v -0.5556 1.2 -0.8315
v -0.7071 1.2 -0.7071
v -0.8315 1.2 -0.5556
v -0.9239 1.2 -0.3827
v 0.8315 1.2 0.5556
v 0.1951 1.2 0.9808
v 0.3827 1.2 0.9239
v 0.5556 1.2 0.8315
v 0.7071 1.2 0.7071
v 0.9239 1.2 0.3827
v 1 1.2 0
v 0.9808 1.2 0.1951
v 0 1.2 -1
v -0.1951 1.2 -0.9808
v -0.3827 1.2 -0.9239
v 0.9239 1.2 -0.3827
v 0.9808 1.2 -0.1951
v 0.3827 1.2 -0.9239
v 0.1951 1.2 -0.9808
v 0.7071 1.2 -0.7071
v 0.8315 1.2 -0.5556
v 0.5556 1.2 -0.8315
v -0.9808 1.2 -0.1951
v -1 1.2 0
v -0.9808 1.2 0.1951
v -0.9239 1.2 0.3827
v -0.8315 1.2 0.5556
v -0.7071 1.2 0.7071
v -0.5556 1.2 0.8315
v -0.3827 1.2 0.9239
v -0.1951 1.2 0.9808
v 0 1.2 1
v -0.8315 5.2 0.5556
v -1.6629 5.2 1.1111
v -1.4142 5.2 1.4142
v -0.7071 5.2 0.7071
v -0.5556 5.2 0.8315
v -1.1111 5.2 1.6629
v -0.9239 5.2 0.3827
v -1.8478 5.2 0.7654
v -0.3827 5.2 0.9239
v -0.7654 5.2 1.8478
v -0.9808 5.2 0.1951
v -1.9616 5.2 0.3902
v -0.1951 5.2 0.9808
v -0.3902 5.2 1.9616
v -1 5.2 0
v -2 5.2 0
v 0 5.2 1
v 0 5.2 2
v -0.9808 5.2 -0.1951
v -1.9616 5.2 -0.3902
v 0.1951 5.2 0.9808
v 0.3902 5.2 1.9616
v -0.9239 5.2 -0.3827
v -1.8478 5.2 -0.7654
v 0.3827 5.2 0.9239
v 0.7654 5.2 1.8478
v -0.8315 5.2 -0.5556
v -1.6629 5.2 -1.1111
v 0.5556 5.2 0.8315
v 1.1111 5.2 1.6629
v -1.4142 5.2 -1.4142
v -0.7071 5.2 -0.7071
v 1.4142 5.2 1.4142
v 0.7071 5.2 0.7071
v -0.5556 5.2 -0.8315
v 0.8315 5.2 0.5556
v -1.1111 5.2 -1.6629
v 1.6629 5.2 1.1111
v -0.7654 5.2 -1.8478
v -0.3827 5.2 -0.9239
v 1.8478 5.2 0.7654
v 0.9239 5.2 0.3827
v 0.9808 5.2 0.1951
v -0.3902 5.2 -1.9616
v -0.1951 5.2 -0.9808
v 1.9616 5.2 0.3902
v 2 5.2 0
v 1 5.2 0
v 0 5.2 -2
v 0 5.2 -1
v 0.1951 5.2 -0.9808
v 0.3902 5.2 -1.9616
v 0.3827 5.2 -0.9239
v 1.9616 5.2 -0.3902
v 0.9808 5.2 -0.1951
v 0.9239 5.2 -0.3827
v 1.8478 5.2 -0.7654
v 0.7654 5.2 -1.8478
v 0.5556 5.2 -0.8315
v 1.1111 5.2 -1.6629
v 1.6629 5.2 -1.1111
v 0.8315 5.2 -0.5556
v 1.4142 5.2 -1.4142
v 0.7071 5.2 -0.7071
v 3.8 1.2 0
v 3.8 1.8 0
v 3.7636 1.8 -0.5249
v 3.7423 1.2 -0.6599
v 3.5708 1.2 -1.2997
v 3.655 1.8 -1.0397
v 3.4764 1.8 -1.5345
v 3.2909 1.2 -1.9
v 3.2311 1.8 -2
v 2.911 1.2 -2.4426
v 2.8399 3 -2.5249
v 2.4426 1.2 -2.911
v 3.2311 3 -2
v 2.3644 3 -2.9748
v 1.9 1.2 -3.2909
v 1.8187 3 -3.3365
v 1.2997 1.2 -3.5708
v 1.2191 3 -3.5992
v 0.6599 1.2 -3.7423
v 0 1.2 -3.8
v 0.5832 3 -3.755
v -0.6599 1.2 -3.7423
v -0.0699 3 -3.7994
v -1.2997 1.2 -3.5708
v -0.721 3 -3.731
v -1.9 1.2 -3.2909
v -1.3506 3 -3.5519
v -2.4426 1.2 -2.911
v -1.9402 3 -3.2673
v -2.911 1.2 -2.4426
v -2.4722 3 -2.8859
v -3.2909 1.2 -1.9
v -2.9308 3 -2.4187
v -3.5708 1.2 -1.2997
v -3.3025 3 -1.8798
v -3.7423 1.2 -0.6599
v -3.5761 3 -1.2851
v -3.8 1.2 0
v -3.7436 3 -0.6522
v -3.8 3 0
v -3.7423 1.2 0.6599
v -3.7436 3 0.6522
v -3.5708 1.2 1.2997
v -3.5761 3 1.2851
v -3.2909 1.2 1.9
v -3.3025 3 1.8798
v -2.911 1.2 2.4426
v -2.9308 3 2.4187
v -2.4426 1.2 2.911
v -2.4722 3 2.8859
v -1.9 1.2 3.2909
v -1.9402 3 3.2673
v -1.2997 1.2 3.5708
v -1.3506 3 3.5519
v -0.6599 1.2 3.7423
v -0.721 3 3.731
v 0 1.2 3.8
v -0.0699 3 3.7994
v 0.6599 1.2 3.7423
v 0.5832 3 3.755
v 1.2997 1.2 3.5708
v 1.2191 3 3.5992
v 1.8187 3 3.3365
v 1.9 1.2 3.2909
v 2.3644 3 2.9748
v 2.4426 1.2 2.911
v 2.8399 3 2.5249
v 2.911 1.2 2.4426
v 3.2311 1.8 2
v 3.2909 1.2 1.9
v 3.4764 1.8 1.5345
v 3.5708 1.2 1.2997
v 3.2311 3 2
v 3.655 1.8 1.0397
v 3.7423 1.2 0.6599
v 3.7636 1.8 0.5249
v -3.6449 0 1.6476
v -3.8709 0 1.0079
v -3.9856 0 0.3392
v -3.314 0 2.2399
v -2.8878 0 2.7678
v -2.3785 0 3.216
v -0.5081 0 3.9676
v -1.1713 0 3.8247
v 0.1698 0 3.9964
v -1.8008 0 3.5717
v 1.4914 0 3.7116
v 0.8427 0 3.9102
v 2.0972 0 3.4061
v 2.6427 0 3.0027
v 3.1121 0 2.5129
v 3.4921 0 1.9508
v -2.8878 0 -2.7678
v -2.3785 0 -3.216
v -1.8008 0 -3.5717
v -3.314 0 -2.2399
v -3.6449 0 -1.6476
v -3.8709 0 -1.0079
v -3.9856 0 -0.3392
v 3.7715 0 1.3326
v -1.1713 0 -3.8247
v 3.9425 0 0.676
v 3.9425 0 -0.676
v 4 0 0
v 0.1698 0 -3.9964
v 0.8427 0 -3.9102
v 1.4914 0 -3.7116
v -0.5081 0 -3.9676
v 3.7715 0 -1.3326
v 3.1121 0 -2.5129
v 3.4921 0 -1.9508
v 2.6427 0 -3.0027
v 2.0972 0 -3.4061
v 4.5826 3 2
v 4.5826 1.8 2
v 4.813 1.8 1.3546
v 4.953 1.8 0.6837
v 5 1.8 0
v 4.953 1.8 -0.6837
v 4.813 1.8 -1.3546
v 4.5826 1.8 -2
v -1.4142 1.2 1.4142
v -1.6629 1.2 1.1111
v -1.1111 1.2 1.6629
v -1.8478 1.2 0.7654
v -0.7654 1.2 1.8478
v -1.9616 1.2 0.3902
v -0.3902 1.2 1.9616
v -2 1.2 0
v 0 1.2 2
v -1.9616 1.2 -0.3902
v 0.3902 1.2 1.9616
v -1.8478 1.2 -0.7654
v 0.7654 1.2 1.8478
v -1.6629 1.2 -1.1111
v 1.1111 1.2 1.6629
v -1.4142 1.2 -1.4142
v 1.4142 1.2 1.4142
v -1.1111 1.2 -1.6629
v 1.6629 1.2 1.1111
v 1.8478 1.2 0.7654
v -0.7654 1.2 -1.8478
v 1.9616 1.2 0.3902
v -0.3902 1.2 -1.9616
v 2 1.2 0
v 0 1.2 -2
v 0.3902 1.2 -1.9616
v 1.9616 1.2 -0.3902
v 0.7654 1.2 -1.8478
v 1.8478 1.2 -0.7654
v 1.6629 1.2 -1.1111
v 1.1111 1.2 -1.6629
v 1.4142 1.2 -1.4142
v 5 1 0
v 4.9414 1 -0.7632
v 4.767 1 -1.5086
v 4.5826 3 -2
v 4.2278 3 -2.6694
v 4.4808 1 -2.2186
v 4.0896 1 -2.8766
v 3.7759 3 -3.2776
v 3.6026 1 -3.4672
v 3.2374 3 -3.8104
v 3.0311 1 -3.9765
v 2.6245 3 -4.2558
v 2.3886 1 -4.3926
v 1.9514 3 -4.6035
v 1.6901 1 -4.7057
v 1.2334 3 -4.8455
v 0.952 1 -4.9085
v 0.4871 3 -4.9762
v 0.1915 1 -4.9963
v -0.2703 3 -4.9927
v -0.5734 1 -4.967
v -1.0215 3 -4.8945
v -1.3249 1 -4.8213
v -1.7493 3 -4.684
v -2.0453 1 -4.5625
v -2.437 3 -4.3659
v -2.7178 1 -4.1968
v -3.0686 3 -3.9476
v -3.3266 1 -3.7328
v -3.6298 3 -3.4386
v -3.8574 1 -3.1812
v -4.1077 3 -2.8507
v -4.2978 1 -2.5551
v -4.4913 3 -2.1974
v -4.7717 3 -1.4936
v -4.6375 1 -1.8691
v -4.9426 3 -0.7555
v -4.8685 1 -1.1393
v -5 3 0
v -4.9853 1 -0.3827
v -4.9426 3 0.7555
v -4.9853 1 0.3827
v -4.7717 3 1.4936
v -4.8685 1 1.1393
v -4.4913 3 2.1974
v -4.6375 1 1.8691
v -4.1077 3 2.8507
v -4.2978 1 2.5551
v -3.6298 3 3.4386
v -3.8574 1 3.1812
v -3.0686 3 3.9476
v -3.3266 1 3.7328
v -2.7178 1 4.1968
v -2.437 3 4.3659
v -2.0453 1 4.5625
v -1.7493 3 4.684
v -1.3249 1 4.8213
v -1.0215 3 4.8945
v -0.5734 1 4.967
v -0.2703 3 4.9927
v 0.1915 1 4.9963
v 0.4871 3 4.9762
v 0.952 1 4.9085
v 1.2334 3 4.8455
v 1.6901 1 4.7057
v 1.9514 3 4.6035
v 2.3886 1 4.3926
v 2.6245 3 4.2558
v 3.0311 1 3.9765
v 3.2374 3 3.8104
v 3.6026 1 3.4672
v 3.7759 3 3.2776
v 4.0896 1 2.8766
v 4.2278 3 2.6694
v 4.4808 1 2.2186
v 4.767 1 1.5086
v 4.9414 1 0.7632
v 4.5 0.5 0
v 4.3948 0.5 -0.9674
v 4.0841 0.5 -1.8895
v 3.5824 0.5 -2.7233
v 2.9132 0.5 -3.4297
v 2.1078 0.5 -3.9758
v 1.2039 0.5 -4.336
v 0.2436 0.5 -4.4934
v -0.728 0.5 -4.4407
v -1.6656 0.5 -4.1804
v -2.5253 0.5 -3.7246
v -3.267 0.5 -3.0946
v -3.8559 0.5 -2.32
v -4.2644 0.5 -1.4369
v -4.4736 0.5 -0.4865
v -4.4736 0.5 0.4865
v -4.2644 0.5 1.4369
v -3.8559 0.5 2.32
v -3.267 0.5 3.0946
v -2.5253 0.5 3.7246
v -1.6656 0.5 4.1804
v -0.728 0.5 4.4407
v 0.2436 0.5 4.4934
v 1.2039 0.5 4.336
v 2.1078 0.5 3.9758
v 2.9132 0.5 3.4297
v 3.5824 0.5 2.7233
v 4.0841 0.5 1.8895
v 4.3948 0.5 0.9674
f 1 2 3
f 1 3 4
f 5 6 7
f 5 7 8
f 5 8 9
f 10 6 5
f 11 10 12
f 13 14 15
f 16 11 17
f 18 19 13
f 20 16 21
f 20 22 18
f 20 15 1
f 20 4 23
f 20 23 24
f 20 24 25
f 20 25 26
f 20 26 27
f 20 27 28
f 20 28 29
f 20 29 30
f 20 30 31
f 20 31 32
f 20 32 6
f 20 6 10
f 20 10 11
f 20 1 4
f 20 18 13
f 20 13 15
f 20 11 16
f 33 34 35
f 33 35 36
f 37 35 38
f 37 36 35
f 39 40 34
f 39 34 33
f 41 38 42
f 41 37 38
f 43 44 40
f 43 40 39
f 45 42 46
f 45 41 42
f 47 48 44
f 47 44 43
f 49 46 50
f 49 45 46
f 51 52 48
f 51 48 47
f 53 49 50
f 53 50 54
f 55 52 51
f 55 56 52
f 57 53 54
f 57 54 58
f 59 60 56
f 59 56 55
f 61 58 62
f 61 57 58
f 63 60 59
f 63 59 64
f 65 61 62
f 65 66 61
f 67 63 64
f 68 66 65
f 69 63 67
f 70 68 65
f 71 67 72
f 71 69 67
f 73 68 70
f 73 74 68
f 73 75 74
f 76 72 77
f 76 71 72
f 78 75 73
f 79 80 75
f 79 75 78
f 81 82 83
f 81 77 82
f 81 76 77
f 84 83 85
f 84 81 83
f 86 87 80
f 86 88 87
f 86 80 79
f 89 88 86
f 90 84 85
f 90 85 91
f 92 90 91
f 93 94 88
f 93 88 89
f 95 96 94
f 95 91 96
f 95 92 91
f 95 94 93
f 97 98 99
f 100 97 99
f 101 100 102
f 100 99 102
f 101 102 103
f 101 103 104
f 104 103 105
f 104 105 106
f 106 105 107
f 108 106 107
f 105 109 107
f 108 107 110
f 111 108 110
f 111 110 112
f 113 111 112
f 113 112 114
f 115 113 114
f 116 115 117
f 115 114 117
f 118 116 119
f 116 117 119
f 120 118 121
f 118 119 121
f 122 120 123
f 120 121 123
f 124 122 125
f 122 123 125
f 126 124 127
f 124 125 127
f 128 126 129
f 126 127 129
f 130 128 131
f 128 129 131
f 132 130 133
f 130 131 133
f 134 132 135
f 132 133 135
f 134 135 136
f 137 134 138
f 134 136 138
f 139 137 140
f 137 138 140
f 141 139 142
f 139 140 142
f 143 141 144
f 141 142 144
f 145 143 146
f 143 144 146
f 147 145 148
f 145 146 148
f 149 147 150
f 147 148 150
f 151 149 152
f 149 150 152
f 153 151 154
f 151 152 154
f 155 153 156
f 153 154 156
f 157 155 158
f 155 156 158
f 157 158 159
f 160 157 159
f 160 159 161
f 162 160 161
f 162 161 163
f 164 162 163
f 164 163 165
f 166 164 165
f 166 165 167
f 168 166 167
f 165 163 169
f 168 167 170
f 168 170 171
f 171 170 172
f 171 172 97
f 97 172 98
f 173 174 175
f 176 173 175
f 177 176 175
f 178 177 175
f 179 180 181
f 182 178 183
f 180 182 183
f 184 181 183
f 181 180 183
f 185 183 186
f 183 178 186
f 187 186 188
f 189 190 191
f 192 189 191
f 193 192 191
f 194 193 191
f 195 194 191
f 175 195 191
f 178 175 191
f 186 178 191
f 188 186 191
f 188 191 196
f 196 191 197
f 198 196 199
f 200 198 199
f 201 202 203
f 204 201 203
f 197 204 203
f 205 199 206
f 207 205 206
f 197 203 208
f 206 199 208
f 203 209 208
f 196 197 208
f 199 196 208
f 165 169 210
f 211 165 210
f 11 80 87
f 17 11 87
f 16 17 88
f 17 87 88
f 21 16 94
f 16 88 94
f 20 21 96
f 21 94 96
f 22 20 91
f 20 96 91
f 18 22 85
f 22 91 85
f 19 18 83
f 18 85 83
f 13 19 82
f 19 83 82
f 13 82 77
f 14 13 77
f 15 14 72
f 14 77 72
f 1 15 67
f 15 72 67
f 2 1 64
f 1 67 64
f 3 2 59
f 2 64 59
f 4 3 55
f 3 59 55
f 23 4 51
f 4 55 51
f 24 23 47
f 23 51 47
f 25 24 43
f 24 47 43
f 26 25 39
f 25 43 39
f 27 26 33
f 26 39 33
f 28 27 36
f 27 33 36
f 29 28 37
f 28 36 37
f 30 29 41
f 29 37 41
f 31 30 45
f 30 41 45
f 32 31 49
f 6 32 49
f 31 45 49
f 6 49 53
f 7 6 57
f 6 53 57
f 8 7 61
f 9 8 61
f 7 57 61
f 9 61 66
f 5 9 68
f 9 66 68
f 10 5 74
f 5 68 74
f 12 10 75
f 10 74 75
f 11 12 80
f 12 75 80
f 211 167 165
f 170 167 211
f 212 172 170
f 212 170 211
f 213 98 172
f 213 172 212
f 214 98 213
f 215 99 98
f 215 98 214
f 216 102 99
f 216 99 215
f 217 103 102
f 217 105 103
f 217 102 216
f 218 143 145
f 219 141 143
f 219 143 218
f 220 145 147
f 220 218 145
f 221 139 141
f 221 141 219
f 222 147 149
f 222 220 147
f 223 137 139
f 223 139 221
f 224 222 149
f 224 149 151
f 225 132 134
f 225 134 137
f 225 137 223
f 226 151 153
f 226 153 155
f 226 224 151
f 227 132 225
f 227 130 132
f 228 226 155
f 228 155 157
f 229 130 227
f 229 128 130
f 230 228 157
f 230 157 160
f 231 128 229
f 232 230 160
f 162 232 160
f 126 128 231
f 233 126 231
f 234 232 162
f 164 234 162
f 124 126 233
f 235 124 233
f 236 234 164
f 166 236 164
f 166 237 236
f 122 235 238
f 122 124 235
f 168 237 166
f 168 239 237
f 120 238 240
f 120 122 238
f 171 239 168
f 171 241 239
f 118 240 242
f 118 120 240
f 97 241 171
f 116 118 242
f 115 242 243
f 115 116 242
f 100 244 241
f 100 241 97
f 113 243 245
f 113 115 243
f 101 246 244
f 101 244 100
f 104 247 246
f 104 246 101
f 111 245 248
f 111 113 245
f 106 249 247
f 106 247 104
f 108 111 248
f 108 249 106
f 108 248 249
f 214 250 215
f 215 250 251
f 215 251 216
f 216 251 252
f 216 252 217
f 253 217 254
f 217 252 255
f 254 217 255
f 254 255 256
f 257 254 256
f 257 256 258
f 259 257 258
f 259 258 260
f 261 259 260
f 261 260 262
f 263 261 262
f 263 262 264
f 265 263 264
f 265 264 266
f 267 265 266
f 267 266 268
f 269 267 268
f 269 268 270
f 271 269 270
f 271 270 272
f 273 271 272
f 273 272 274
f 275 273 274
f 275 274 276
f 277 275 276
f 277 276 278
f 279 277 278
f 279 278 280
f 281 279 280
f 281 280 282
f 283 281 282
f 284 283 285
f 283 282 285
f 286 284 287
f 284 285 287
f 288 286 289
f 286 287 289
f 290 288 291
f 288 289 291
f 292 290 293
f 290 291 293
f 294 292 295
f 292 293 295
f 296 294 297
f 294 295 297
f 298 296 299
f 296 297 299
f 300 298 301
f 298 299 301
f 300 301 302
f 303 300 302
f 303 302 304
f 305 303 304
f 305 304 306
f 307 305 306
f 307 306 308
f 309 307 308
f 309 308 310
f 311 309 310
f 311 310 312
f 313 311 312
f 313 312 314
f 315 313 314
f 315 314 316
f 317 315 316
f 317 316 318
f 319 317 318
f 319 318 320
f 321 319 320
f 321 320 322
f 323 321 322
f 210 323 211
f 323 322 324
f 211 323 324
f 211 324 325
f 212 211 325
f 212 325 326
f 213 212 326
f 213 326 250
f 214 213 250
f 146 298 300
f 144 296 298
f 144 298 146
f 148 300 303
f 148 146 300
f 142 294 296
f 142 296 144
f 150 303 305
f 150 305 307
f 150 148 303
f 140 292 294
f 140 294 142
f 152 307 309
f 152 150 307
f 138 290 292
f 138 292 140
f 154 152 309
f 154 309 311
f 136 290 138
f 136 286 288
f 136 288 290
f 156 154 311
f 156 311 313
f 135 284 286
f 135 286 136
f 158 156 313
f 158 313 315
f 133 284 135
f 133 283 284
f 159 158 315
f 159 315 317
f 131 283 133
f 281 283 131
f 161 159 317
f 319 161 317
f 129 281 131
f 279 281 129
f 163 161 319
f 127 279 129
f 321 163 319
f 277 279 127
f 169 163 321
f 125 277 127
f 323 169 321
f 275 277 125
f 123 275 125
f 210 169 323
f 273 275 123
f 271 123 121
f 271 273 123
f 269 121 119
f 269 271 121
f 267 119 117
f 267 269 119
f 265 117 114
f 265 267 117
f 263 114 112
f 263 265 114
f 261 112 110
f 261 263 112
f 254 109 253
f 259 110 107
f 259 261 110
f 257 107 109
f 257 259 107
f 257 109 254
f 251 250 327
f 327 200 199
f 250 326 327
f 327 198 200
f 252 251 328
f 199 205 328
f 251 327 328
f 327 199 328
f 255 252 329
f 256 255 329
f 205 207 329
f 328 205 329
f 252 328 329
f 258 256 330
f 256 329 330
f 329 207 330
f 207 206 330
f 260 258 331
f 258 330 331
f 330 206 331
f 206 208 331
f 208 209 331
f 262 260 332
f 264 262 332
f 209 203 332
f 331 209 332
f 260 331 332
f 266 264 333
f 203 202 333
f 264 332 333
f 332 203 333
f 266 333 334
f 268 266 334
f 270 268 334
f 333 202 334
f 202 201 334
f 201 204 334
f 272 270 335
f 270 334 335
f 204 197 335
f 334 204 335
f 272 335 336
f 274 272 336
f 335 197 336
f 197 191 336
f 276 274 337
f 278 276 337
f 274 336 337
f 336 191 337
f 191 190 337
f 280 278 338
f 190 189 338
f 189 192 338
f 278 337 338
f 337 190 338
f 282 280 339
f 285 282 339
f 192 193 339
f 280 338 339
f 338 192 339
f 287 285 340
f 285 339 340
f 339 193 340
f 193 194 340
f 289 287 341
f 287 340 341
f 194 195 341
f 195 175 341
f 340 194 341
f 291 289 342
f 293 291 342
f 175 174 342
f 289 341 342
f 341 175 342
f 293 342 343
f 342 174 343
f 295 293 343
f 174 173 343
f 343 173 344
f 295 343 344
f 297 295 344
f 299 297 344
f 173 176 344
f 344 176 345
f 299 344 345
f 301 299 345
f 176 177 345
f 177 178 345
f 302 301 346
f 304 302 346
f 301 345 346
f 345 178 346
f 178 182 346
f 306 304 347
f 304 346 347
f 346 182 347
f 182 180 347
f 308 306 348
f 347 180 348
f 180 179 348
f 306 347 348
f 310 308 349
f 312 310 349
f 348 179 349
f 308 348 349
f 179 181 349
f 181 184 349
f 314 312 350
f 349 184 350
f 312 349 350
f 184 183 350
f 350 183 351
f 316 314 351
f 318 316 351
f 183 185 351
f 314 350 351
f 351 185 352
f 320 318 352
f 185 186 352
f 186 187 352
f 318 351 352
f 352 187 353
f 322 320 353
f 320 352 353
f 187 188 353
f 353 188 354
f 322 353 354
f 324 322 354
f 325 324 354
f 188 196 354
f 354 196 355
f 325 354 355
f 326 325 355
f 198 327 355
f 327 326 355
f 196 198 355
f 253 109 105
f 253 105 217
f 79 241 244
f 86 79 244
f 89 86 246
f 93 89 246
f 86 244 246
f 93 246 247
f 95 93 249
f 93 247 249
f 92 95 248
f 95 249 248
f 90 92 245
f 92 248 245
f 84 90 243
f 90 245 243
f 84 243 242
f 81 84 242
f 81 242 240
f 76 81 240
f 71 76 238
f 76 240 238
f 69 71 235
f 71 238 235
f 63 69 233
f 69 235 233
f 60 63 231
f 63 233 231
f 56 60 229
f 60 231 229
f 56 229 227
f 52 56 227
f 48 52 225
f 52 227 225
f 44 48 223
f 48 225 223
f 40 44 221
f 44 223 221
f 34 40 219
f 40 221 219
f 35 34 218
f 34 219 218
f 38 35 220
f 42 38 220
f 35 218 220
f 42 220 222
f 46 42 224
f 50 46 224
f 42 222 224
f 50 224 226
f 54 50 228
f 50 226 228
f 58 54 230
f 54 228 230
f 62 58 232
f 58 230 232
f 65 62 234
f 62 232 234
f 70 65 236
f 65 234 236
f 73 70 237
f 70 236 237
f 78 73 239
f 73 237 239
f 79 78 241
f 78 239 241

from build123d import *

# Parameters (mm, degrees)
SKETCH1_R           = 5
BOSS_EXTRUDE1_DEPTH = 3
SKETCH3_R           = 3.8
CUT_EXTRUDE1_DEPTH  = 1.8
SKETCH4_R           = 2
BOSS_EXTRUDE2_DEPTH = 4
SKETCH5_R           = 1
CUT_EXTRUDE2_DEPTH  = 4
SKETCH6_W           = 4
SKETCH6_H           = 4
CUT_EXTRUDE3_DEPTH  = 1.2
CHAMFER1_SIZE       = 1


with BuildPart() as part:
    # Sketch1 → Boss-Extrude1 (new body)
    with BuildSketch(Plane(origin=(0, 0, 0), x_dir=(1, 0, 0), z_dir=(0, 1, 0))):
        Circle(SKETCH1_R)
    extrude(amount=BOSS_EXTRUDE1_DEPTH)

    # Sketch3 → Cut-Extrude1 (cut)
    with BuildSketch(Plane(origin=(0, 3, 0), x_dir=(1, 0, 0), z_dir=(0, 1, 0))):
        Circle(SKETCH3_R)
    extrude(amount=-CUT_EXTRUDE1_DEPTH, mode=Mode.SUBTRACT)

    # Sketch4 → Boss-Extrude2 (add)
    with BuildSketch(Plane(origin=(0, 1.2, 0), x_dir=(1, 0, 0), z_dir=(0, 1, 0))):
        Circle(SKETCH4_R)
    extrude(amount=BOSS_EXTRUDE2_DEPTH)

    # Sketch5 → Cut-Extrude2 (cut)
    with BuildSketch(Plane(origin=(0, 5.2, 0), x_dir=(1, 0, 0), z_dir=(0, 1, 0))):
        Circle(SKETCH5_R)
    extrude(amount=-CUT_EXTRUDE2_DEPTH, mode=Mode.SUBTRACT)

    # Sketch6 → Cut-Extrude3 (cut)
    with BuildSketch(Plane(origin=(0, 3, 0), x_dir=(1, 0, 0), z_dir=(0, 1, 0))):
        with Locations((4, 0)):
            Rectangle(SKETCH6_W, SKETCH6_H)
    extrude(amount=-CUT_EXTRUDE3_DEPTH, mode=Mode.SUBTRACT)

    # Chamfer1
    chamfer1_edges = [part.edges().sort_by_distance(p)[0] for p in [
        (-5, 0, 0),
    ]]
    chamfer(chamfer1_edges, length=CHAMFER1_SIZE)


solid = part.part
